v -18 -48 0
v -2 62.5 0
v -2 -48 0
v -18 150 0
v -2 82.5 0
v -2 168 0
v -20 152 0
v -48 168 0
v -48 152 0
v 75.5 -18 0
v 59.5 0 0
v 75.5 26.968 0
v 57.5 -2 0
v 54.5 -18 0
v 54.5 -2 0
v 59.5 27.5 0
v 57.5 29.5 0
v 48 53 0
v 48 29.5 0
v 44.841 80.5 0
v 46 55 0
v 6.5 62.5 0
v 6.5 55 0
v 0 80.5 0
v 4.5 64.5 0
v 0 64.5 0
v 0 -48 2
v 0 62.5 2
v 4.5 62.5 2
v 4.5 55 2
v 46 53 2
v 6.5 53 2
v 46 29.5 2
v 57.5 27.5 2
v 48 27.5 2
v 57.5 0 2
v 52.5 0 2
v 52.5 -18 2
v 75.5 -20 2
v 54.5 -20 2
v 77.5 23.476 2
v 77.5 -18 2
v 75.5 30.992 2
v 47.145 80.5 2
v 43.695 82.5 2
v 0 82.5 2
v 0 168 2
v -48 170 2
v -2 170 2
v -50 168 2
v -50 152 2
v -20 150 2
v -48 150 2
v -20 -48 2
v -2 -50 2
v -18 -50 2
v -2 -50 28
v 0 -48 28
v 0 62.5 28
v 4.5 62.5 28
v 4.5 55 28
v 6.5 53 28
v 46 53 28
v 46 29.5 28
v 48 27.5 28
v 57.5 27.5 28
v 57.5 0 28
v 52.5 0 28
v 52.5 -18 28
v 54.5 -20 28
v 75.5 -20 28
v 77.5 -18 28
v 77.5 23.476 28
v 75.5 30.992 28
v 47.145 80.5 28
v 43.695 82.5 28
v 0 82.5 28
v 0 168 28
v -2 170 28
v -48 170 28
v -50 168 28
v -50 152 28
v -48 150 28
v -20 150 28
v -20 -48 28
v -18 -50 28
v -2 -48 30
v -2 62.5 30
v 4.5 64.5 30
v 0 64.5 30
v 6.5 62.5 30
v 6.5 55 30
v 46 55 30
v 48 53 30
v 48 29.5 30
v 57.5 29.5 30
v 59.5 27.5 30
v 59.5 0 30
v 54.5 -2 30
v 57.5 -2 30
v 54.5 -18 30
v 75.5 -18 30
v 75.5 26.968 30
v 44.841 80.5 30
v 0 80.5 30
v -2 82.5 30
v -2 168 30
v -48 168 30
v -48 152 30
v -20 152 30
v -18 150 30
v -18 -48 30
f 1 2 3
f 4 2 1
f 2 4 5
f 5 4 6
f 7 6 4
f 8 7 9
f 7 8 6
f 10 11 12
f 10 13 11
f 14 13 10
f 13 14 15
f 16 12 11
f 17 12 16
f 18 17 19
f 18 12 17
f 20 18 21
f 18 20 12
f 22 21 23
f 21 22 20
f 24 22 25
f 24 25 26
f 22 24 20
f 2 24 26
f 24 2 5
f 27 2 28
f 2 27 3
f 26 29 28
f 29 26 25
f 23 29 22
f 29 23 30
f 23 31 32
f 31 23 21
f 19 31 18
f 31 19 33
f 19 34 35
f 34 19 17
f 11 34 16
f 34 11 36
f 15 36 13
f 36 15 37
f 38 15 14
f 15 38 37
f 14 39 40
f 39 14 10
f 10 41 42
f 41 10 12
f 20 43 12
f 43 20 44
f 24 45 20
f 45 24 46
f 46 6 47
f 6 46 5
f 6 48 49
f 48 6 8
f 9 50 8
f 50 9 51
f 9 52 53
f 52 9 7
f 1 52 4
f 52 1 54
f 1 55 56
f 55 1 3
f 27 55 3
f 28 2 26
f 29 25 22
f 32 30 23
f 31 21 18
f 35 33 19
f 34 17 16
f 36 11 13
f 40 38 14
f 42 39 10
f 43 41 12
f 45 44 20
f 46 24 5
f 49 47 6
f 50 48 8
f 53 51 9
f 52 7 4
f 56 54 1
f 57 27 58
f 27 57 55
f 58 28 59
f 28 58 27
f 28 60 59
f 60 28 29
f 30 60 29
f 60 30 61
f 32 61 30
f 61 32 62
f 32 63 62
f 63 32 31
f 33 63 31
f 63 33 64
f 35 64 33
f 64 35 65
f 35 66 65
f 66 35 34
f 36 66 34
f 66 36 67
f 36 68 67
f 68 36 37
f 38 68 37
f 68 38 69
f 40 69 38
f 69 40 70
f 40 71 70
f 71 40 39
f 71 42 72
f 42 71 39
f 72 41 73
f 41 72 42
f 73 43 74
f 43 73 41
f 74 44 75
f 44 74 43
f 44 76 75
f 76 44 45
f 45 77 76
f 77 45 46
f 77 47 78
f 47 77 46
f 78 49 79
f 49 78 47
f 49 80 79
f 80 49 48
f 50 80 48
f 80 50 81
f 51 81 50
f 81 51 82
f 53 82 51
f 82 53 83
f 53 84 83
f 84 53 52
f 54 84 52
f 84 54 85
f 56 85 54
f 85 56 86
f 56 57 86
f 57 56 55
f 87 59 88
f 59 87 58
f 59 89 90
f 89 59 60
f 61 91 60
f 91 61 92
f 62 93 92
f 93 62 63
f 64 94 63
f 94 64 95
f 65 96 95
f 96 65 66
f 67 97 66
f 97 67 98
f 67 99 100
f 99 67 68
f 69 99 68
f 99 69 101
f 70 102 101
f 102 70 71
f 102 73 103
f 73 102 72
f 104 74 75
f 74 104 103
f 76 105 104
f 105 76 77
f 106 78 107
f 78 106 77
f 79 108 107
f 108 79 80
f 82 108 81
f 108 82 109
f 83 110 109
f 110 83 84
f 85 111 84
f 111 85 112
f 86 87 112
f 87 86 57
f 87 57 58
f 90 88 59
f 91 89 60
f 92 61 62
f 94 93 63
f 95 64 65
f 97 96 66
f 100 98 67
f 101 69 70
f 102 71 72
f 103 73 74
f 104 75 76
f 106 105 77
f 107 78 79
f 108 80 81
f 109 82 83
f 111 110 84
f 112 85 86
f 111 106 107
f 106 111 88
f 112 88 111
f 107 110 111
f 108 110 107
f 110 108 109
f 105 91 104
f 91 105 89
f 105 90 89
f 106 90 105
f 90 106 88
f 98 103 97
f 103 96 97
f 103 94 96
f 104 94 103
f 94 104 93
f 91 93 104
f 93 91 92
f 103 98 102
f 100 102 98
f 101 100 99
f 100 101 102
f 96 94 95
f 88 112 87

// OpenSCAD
// file: ../functions/vectors2D.scad
/* * * * * * * * * * * * * * * * * * * * * * * * * * * * * * * * * * * * *\
 * Copyright (C) Claus Schrammel <claus@f05fk.net>                       *
 *                                                                       *
 * This program is free software: you can redistribute it and/or modify  *
 * it under the terms of the GNU General Public License as published by  *
 * the Free Software Foundation, either version 3 of the License, or     *
 * (at your option) any later version.                                   *
 *                                                                       *
 * This program is distributed in the hope that it will be useful,       *
 * but WITHOUT ANY WARRANTY; without even the implied warranty of        *
 * MERCHANTABILITY or FITNESS FOR A PARTICULAR PURPOSE.  See the         *
 * GNU General Public License for more details.                          *
 *                                                                       *
 * You should have received a copy of the GNU General Public License     *
 * along with this program.  If not, see <http://www.gnu.org/licenses/>. *
 *                                                                       *
 * SPDX-License-Identifier: GPL-3.0-or-later                             *
\* * * * * * * * * * * * * * * * * * * * * * * * * * * * * * * * * * * * */

include <utils.scad>

function normal_vector_2D(vector) = [-vector.y, vector.x];
function unit_vector_2D(vector) = vector / norm(vector);

/*
 * Calculates the coefficient for v1 to get from p1 to the intersection point of the two lines p1/v1 and p2/v2:
 * intersection_point = p1 + v1 * intersection_coefficient1.
 */
function intersection_coefficient1(p1, v1, p2, v2) = ( v2.x * (p1.y - p2.y) - v2.y * (p1.x - p2.x) ) / (v1.x * v2.y - v1.y * v2.x);

/*
 * Calculates the coefficient for v2 to get from p2 to the intersection point of the two lines p1/v1 and p2/v2:
 * intersection_point = p2 + v2 * intersection_coefficient2.
 */
function intersection_coefficient2(p1, v1, p2, v2) = intersection_coefficient1(p2, v2, p1, v1);

/*
 * Calculates the intersection point of the two lines p1/v1 and p2/v2.
 */
function intersection_point(p1, v1, p2, v2) = p1 + v1 * intersection_coefficient1(p1, v1, p2, v2);
// file: ../functions/utils.scad
/* * * * * * * * * * * * * * * * * * * * * * * * * * * * * * * * * * * * *\
 * Copyright (C) Claus Schrammel <claus@f05fk.net>                       *
 *                                                                       *
 * This program is free software: you can redistribute it and/or modify  *
 * it under the terms of the GNU General Public License as published by  *
 * the Free Software Foundation, either version 3 of the License, or     *
 * (at your option) any later version.                                   *
 *                                                                       *
 * This program is distributed in the hope that it will be useful,       *
 * but WITHOUT ANY WARRANTY; without even the implied warranty of        *
 * MERCHANTABILITY or FITNESS FOR A PARTICULAR PURPOSE.  See the         *
 * GNU General Public License for more details.                          *
 *                                                                       *
 * You should have received a copy of the GNU General Public License     *
 * along with this program.  If not, see <http://www.gnu.org/licenses/>. *
 *                                                                       *
 * SPDX-License-Identifier: GPL-3.0-or-later                             *
\* * * * * * * * * * * * * * * * * * * * * * * * * * * * * * * * * * * * */

// the modulo operator % creates negative results for negative inputs n
function modulo(n, m) = ((n % m) + m) % m;

function cyclic_array(array, index) = array[modulo(index, len(array))];
// file: ../functions/polygons.scad
/* * * * * * * * * * * * * * * * * * * * * * * * * * * * * * * * * * * * *\
 * Copyright (C) Claus Schrammel <claus@f05fk.net>                       *
 *                                                                       *
 * This program is free software: you can redistribute it and/or modify  *
 * it under the terms of the GNU General Public License as published by  *
 * the Free Software Foundation, either version 3 of the License, or     *
 * (at your option) any later version.                                   *
 *                                                                       *
 * This program is distributed in the hope that it will be useful,       *
 * but WITHOUT ANY WARRANTY; without even the implied warranty of        *
 * MERCHANTABILITY or FITNESS FOR A PARTICULAR PURPOSE.  See the         *
 * GNU General Public License for more details.                          *
 *                                                                       *
 * You should have received a copy of the GNU General Public License     *
 * along with this program.  If not, see <http://www.gnu.org/licenses/>. *
 *                                                                       *
 * SPDX-License-Identifier: GPL-3.0-or-later                             *
\* * * * * * * * * * * * * * * * * * * * * * * * * * * * * * * * * * * * */

include <utils.scad>
include <vectors2D.scad>

/*
 * Shrinks the polygon by moving the edges "inwards" by the given distance.
 * The points need to be given in the counter-clockwise order, i.e. applying the
 * right-hand rule with the thumb pointing in the z direction.
 */
function shrink_edges(points, distance) =
    [ for (i = [0 : 1 : len(points) - 1])
        let (p1 = cyclic_array(points, i - 1), p2 = cyclic_array(points, i), p3 = cyclic_array(points, i + 1),
                v1 = p2 - p1, v2 = p3 - p2,
                n1 = unit_vector_2D(normal_vector_2D(v1)), n2 = unit_vector_2D(normal_vector_2D(v2)))
            intersection_point(p1 + n1 * distance, v1, p2 + n2 * distance, v2)
    ];

/*
 * Grows the polygon by moving the edges "outwards" by the given distance.
 * The points need to be given in the counter-clockwise order, i.e. applying the
 * right-hand rule with the thumb pointing in the z direction.
 */
function grow_edges(points, distance) = shrink_edges(points, -distance);

/*
 * Flattens the corners of the polygon by cutting off at the intersection points where one of the edges
 * is moved "inwards" by the given distance, while the other edge is not, and vice-versa.
 * The points need to be given in the counter-clockwise order, i.e. applying the
 * right-hand rule with the thumb pointing in the z direction.
 */
function flatten_corners(points, distance) = 
    [ for (i = [0 : 1 : len(points) - 1])
        let (p1 = cyclic_array(points, i - 1), p2 = cyclic_array(points, i), p3 = cyclic_array(points, i + 1),
                v1 = p2 - p1, v2 = p3 - p2,
                n1 = unit_vector_2D(normal_vector_2D(v1)), n2 = unit_vector_2D(normal_vector_2D(v2)))
            each [
                intersection_point(p1, v1, p2 + n2 * distance, v2),
                intersection_point(p1 + n1 * distance, v1, p2, v2)
            ]
    ];
// main file
/* * * * * * * * * * * * * * * * * * * * * * * * * * * * * * * * * * * * *\
 * Copyright (C) Claus Schrammel <claus@f05fk.net>                       *
 *                                                                       *
 * This program is free software: you can redistribute it and/or modify  *
 * it under the terms of the GNU General Public License as published by  *
 * the Free Software Foundation, either version 3 of the License, or     *
 * (at your option) any later version.                                   *
 *                                                                       *
 * This program is distributed in the hope that it will be useful,       *
 * but WITHOUT ANY WARRANTY; without even the implied warranty of        *
 * MERCHANTABILITY or FITNESS FOR A PARTICULAR PURPOSE.  See the         *
 * GNU General Public License for more details.                          *
 *                                                                       *
 * You should have received a copy of the GNU General Public License     *
 * along with this program.  If not, see <http://www.gnu.org/licenses/>. *
 *                                                                       *
 * SPDX-License-Identifier: GPL-3.0-or-later                             *
\* * * * * * * * * * * * * * * * * * * * * * * * * * * * * * * * * * * * */

use <../modules/PrismaChamfered.scad>

c = 2;
e = 30;
w = 20;

h0 = -50;
h1 = 27.5;
h2 = 53.0;
h3 = 62.5;
h4 = 150;

l0 = -50;
l1 =  4.5;
l2 = 46.0;
l3 = 57.5;
lx = l3 - 5;

polygon = [[0, h0], [0, h3], [l1, h3], [l1, h2], [l2, h2], [l2, h1], [l3, h1], [l3, 0], [lx, 0], [lx, -w],
           [l3+w, -w], [l3+w, h1], [l2, h3+w], [0, h3+w], [0, h4+w], [l0, h4+w], [l0, h4], [-w, h4], [-w, h0]];

PrismaChamfered(points = polygon, height = e, chamfer = c);
